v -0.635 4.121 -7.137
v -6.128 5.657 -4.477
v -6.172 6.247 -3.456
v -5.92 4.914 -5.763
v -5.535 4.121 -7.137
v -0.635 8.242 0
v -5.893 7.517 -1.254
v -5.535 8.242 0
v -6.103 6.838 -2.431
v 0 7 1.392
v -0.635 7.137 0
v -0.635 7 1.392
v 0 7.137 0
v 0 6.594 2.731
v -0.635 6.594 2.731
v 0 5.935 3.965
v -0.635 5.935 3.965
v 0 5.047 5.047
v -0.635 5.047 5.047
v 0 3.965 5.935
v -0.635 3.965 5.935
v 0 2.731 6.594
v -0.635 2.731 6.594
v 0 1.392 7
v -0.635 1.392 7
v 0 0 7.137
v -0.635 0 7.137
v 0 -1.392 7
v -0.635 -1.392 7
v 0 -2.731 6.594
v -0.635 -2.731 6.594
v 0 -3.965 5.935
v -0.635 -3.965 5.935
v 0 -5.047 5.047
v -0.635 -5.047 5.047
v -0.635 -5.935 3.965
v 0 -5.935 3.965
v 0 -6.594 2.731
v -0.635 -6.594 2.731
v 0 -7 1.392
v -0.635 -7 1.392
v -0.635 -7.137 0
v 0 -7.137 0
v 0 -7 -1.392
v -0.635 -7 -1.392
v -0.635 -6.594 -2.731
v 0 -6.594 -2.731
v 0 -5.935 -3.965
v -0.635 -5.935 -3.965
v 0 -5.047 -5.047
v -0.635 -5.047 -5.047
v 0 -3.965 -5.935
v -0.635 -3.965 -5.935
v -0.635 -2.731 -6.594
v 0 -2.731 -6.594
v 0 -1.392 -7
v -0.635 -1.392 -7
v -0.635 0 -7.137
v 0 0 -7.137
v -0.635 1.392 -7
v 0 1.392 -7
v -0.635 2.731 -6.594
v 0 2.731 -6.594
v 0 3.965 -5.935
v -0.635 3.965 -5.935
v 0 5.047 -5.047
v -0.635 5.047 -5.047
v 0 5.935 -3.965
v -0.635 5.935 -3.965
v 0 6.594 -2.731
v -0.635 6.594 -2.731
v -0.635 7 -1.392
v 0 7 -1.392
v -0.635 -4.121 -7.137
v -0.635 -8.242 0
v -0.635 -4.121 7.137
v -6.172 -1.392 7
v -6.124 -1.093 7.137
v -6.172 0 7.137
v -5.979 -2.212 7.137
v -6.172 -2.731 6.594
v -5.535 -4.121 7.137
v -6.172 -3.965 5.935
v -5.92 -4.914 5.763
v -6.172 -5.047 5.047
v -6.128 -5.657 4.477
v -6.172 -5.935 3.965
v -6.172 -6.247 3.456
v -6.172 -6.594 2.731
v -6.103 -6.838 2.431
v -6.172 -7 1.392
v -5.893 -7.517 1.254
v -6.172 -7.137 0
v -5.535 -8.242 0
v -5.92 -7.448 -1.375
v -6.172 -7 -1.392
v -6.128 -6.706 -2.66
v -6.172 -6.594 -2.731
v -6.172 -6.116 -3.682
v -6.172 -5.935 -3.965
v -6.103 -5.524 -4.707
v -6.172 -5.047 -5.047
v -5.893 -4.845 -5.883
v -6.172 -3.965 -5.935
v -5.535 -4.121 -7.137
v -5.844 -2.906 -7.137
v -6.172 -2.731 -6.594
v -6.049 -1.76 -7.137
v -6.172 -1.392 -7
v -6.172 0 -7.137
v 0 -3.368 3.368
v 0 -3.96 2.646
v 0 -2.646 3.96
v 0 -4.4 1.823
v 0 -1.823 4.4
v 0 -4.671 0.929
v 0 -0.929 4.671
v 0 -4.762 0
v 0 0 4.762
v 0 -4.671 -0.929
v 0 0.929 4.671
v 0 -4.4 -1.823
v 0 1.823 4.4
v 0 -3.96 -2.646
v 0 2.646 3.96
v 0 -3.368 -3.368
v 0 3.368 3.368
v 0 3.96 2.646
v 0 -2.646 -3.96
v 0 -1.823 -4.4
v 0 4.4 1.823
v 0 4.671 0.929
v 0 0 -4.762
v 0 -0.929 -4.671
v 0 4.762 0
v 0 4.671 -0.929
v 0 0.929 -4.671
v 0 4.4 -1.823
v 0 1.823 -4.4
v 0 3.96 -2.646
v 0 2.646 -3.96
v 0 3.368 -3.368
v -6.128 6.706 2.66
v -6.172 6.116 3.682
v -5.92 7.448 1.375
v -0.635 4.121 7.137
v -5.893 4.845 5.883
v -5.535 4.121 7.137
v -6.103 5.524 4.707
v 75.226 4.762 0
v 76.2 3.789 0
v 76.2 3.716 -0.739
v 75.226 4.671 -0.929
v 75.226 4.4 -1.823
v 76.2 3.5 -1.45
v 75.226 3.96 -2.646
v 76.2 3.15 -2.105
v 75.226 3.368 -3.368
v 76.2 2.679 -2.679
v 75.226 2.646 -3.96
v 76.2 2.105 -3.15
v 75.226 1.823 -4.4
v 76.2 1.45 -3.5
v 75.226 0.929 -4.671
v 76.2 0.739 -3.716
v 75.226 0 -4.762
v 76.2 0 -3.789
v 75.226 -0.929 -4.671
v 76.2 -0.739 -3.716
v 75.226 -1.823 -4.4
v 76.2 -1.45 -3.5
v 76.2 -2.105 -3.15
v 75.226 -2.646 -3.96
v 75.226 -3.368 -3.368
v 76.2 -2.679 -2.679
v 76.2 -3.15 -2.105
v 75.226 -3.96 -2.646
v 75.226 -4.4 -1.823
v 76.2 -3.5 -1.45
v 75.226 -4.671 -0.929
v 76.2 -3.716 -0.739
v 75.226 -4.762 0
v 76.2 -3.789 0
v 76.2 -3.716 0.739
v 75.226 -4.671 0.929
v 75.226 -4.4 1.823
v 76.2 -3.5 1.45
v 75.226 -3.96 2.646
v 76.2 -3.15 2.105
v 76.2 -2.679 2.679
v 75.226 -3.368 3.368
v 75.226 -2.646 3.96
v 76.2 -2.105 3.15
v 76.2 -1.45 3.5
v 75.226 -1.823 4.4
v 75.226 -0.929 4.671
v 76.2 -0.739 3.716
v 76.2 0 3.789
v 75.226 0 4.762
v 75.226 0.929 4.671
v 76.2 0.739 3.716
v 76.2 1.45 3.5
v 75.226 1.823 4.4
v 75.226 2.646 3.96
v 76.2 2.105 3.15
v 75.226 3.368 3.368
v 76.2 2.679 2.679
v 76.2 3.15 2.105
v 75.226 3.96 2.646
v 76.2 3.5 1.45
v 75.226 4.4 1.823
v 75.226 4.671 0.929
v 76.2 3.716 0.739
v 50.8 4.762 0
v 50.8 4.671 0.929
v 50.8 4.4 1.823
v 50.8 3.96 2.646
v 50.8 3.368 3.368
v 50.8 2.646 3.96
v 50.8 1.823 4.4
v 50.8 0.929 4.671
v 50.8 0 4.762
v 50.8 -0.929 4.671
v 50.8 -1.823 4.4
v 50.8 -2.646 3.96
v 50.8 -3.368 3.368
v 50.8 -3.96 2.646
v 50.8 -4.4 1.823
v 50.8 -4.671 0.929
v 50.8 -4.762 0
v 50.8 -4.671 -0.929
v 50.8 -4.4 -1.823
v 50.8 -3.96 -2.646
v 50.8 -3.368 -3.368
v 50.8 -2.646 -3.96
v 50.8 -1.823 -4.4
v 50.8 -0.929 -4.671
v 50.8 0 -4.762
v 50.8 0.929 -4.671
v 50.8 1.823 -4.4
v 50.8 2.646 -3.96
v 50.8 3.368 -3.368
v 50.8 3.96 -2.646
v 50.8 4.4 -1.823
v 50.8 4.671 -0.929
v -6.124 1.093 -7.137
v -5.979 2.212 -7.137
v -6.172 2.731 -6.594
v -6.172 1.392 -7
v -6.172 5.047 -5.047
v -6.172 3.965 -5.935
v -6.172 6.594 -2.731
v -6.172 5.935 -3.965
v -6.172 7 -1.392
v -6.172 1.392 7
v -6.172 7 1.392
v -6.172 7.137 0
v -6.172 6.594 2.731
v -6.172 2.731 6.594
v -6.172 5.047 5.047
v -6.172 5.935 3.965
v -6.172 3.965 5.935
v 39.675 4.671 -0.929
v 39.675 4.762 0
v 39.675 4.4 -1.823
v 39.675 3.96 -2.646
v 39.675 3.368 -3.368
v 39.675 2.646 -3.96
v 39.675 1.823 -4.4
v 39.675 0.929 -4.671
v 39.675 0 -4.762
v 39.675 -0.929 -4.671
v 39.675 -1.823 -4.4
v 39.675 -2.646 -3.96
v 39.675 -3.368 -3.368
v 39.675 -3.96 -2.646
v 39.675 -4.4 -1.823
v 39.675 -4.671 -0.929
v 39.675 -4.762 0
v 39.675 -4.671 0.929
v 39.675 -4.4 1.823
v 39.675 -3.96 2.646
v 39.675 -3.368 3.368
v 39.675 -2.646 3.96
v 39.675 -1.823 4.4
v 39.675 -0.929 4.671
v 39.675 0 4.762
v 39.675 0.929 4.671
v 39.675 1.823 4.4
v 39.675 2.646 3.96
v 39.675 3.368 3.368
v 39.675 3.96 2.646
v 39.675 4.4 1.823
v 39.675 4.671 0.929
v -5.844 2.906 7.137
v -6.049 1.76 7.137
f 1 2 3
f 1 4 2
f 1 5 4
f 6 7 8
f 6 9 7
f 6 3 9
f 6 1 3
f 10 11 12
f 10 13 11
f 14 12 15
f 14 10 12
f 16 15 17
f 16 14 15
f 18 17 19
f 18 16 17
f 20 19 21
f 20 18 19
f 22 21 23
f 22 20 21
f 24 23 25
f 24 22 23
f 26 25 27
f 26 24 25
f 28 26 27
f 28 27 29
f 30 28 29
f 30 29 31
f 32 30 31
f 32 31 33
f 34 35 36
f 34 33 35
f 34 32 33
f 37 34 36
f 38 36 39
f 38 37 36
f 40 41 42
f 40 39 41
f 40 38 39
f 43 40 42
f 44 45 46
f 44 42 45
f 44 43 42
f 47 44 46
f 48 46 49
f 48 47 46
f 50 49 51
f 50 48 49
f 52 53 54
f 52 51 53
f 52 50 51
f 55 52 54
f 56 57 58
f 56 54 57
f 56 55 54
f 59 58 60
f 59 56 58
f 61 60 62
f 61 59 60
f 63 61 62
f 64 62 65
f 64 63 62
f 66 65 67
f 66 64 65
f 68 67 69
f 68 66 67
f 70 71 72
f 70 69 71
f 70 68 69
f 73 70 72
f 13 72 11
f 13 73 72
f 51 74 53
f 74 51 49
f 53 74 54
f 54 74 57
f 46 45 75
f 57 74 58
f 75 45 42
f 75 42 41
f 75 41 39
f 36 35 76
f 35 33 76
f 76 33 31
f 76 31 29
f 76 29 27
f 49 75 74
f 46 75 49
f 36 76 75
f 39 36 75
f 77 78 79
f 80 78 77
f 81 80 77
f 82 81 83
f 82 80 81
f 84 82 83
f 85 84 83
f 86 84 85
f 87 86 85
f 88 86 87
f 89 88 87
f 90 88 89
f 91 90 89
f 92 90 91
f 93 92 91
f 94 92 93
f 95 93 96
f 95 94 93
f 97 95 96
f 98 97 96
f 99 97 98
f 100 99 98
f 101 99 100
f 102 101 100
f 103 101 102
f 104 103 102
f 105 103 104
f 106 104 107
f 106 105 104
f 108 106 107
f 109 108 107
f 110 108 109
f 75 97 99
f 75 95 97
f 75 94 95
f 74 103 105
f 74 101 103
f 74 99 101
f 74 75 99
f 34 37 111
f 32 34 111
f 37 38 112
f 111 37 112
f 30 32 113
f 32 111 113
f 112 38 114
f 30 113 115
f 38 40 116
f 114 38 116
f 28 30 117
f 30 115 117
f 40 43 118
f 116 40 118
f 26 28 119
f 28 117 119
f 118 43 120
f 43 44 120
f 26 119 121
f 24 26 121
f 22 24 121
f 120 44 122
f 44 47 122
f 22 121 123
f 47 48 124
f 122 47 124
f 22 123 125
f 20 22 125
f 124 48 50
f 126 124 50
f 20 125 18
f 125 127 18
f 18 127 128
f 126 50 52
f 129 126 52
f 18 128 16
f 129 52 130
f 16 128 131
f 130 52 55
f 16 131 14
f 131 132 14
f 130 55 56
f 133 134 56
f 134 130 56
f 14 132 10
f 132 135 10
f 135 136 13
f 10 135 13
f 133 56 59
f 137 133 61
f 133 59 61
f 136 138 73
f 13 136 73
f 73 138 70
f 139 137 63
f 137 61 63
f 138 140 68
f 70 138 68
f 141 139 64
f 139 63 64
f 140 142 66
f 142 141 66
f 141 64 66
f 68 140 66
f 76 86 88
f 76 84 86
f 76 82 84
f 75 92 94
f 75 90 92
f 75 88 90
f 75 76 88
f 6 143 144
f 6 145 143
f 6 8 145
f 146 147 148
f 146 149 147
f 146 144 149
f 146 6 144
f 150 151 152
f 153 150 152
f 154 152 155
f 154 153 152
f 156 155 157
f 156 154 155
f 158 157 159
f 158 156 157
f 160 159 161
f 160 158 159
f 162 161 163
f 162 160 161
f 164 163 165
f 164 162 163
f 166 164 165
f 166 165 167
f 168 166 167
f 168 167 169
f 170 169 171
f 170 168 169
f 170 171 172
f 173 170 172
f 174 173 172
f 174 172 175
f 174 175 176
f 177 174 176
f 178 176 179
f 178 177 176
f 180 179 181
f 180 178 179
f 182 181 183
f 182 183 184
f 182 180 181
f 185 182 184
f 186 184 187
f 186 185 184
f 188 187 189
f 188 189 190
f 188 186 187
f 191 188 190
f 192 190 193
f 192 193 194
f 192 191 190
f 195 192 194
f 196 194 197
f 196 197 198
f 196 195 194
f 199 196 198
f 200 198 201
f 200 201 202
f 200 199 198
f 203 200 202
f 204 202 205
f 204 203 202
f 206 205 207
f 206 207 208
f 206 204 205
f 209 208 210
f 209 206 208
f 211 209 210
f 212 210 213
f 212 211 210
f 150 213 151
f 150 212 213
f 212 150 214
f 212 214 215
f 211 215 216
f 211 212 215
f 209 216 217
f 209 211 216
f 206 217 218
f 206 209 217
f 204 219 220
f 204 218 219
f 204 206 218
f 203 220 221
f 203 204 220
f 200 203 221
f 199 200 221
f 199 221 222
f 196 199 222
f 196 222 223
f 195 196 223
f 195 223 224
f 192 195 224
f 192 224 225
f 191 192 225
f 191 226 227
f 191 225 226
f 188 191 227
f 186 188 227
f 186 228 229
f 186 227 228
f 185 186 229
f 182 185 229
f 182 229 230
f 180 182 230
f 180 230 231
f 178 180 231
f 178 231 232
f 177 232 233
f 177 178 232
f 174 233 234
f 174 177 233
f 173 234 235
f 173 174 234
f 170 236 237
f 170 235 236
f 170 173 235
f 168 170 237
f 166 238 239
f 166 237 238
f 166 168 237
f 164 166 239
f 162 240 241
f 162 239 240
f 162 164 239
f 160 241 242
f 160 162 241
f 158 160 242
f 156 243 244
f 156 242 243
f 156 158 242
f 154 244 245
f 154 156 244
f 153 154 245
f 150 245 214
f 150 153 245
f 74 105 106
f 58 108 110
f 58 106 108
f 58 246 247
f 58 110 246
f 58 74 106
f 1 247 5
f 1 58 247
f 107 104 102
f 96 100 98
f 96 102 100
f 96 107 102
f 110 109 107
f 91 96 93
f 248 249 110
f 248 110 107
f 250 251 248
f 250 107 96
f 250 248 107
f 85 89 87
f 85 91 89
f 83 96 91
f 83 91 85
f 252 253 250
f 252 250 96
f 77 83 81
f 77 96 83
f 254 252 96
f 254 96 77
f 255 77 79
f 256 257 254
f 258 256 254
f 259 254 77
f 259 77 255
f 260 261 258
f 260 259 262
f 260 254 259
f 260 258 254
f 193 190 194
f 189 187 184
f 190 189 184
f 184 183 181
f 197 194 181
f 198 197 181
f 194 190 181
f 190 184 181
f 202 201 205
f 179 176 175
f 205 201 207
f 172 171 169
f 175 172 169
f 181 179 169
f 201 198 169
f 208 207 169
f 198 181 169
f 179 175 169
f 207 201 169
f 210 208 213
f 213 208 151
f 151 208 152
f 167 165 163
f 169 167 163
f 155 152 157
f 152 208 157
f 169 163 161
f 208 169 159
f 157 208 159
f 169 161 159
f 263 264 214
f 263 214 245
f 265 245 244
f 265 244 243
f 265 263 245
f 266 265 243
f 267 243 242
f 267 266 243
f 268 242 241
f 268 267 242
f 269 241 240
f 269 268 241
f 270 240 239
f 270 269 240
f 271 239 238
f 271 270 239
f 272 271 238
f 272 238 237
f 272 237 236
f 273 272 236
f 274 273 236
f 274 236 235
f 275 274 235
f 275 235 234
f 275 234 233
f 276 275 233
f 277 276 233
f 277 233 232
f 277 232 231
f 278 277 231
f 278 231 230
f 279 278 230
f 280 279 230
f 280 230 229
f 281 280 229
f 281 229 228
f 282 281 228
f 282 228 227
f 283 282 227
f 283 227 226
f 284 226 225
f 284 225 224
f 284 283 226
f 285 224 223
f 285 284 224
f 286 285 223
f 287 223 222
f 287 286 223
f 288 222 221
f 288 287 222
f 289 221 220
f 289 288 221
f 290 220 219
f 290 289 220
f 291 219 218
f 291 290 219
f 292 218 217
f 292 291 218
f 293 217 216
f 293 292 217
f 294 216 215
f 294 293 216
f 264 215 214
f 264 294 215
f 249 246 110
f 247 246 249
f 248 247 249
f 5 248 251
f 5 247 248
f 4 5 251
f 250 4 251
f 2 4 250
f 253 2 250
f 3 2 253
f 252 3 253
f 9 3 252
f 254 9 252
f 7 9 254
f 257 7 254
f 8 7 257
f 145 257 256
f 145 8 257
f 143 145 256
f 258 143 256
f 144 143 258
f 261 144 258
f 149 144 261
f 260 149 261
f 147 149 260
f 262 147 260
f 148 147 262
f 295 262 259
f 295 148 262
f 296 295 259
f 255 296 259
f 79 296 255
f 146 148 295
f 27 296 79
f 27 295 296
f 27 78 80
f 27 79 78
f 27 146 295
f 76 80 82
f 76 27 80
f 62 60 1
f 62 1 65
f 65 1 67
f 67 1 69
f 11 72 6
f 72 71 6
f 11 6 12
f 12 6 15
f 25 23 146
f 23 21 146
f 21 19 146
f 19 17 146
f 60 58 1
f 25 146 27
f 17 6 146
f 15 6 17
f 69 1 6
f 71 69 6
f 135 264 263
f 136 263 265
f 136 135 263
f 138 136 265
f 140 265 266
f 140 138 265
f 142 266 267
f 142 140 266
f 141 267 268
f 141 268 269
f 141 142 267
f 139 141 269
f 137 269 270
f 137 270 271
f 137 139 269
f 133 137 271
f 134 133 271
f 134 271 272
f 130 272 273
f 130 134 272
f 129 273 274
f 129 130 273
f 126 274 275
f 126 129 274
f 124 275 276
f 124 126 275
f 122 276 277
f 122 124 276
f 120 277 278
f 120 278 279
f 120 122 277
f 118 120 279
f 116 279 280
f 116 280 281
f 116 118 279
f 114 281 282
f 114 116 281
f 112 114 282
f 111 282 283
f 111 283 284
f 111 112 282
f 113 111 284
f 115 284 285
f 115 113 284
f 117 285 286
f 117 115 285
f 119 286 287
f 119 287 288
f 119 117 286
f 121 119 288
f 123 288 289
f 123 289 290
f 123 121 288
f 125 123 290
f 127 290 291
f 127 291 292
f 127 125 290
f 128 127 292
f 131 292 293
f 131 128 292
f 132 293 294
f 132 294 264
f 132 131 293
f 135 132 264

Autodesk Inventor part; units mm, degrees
ref_plane "YZ Plane" through (0, 0, 0) normal (1, 0, 0) x (0, 1, 0)
ref_plane "XZ Plane" through (0, 0, 0) normal (0, 1, 0) x (-1, 0, 0)
sketch "Sketch1" plane through (0, 0, 0) normal (0, 0, 1) x (1, 0, 0)
  line L0 (0, 7.1374) -> (0, 4.7625)
  line L1 (50.8, 4.7625) -> (76.2, 4.7625)
  line L2 (76.2, 4.7625) -> (76.2, 0)
  line L3 (76.2, 0) -> (-0.6351, 0)
  line L4 (-16.0021, 0) -> (91.567, 0) projected
  line L5 (-0.6351, 0) -> (-0.6351, 7.1374)
  line L6 (-0.6351, 7.1374) -> (0, 7.1374)
  line L7 (50.8, 4.7625) -> (39.6747, 4.7625)
  line L8 (39.6747, 4.7625) -> (0, 4.7625)
  line L9 (0, -1.4275) -> (0, 8.5649) projected
  dimension "d0" = 76.2
  dimension "d1" = 25.4
  dimension "d2" = 9.525
  dimension "d9" = 0.6351
  dimension "d10" = 14.2748
  dimension "d13" = 11.1253
  dimension "d14" = 9.525
revolve "Body" add sketch "Sketch1" angle 360 about axis through (76.2, 0, 0) along (-1, 0, 0)
sketch "Sketch2" plane through (-0.6351, 0, 0) normal (-1, 0, 0) x (0, 0, 1)
  line L0 (0, 8.2416) -> (7.1374, 4.1208)
  line L1 (7.1374, 4.1208) -> (7.1374, -4.1208)
  line L2 (7.1374, -4.1208) -> (0, -8.2416)
  line L3 (0, -8.2416) -> (-7.1374, -4.1208)
  line L4 (-7.1374, -4.1208) -> (-7.1374, 4.1208)
  line L5 (-7.1374, 4.1208) -> (0, 8.2416)
  point P0 (0, 0)
  point P1 (0, 0)
  dimension "d11" = 14.2748
extrude "Head" add sketch "Sketch2" along normal blind 5.5372
sketch "Sketch4" plane through (0, 0, 0) normal (0, 0, 1) x (1, 0, 0)
  line L0 (-6.1723, 7.1374) -> (-6.1723, 8.2416)
  line L1 (-6.1723, 8.2416) -> (-5.5348, 8.2416)
  line L2 (-5.5348, 8.2416) -> (-6.1723, 7.1374)
  line L3 (-7.2797, 0) -> (0.4723, 0) projected
  line L4 (-0.6351, 8.2416) -> (-6.1723, 8.2416) projected
  line L5 (-6.1723, 4.1208) -> (-6.1723, 8.2416) projected
  dimension "d5" = 30
  dimension "d19" = 14.2748
revolve "Chamfer1" cut sketch "Sketch4" angle 360 about axis through (-10, 0, 0) along (1, 0, 0)
thread "Thread" size "3/8-16 UNC" class "2A" standard "ANSI Unified Screw Threads" length 25.4
chamfer "Chamfer2" distance 0.9738 distance2 0.9739 1 edges at (76.2, -4.7625, 0) measured on face at (76.2, 1.3701, -0.315)
ref_plane "Work Plane1" through (1.525, 0, 0) normal (0, 0, 1) x (1, 0, 0)
equation "\"d0\" = NLG"
equation "\"d1\" = GEL"
equation "\"d2\" = GD"
equation "\"d10\" = SD2"
equation "\"d14\" = BDM"
equation "\"d11\" = SW"
equation "\"d3\" = KOH - SD"
equation "\"d5\" = ANG1"
equation "\"d19\" = SW0"
equation "\"d15\" = GEL"
equation "\"d6\" = -0.5 * SPD + 0.5 * GD"
equation "\"NLG\" = 76.2"
equation "\"GD\" = 9.525"
equation "\"BDM\" = 9.525"
equation "\"KOH\" = 6.1722"
equation "\"GEL\" = 25.4"
equation "\"SW\" = 14.2748"
equation "\"SW0\" = SW"
equation "\"SPD\" = GD1"
equation "\"SD2\" = SW"
equation "\"SD\" = 0.635"
equation "\"ANG1\" = 30deg"
equation "\"GAL\" = 11.1252"
equation "\"GUL\" = 0.97384"
equation "\"RR\" = 0.381"
equation "\"WFT\" = SD"
equation "\"GD1\" = 7.57733"
equation "\"THREADDIA\" = 9.525"
equation "\"SDH\" = SW"
equation "\"SDHG\" = 39.6748"
equation "\"TOA\" = 30deg"
equation "\"FAWI\" = 45deg"
equation "\"NND\" = 9.525"
equation "\"E0\" = 16.48739"
properties part number "AS 2465 - 3/8 x 3  UNC" material "Steel, Mild"
